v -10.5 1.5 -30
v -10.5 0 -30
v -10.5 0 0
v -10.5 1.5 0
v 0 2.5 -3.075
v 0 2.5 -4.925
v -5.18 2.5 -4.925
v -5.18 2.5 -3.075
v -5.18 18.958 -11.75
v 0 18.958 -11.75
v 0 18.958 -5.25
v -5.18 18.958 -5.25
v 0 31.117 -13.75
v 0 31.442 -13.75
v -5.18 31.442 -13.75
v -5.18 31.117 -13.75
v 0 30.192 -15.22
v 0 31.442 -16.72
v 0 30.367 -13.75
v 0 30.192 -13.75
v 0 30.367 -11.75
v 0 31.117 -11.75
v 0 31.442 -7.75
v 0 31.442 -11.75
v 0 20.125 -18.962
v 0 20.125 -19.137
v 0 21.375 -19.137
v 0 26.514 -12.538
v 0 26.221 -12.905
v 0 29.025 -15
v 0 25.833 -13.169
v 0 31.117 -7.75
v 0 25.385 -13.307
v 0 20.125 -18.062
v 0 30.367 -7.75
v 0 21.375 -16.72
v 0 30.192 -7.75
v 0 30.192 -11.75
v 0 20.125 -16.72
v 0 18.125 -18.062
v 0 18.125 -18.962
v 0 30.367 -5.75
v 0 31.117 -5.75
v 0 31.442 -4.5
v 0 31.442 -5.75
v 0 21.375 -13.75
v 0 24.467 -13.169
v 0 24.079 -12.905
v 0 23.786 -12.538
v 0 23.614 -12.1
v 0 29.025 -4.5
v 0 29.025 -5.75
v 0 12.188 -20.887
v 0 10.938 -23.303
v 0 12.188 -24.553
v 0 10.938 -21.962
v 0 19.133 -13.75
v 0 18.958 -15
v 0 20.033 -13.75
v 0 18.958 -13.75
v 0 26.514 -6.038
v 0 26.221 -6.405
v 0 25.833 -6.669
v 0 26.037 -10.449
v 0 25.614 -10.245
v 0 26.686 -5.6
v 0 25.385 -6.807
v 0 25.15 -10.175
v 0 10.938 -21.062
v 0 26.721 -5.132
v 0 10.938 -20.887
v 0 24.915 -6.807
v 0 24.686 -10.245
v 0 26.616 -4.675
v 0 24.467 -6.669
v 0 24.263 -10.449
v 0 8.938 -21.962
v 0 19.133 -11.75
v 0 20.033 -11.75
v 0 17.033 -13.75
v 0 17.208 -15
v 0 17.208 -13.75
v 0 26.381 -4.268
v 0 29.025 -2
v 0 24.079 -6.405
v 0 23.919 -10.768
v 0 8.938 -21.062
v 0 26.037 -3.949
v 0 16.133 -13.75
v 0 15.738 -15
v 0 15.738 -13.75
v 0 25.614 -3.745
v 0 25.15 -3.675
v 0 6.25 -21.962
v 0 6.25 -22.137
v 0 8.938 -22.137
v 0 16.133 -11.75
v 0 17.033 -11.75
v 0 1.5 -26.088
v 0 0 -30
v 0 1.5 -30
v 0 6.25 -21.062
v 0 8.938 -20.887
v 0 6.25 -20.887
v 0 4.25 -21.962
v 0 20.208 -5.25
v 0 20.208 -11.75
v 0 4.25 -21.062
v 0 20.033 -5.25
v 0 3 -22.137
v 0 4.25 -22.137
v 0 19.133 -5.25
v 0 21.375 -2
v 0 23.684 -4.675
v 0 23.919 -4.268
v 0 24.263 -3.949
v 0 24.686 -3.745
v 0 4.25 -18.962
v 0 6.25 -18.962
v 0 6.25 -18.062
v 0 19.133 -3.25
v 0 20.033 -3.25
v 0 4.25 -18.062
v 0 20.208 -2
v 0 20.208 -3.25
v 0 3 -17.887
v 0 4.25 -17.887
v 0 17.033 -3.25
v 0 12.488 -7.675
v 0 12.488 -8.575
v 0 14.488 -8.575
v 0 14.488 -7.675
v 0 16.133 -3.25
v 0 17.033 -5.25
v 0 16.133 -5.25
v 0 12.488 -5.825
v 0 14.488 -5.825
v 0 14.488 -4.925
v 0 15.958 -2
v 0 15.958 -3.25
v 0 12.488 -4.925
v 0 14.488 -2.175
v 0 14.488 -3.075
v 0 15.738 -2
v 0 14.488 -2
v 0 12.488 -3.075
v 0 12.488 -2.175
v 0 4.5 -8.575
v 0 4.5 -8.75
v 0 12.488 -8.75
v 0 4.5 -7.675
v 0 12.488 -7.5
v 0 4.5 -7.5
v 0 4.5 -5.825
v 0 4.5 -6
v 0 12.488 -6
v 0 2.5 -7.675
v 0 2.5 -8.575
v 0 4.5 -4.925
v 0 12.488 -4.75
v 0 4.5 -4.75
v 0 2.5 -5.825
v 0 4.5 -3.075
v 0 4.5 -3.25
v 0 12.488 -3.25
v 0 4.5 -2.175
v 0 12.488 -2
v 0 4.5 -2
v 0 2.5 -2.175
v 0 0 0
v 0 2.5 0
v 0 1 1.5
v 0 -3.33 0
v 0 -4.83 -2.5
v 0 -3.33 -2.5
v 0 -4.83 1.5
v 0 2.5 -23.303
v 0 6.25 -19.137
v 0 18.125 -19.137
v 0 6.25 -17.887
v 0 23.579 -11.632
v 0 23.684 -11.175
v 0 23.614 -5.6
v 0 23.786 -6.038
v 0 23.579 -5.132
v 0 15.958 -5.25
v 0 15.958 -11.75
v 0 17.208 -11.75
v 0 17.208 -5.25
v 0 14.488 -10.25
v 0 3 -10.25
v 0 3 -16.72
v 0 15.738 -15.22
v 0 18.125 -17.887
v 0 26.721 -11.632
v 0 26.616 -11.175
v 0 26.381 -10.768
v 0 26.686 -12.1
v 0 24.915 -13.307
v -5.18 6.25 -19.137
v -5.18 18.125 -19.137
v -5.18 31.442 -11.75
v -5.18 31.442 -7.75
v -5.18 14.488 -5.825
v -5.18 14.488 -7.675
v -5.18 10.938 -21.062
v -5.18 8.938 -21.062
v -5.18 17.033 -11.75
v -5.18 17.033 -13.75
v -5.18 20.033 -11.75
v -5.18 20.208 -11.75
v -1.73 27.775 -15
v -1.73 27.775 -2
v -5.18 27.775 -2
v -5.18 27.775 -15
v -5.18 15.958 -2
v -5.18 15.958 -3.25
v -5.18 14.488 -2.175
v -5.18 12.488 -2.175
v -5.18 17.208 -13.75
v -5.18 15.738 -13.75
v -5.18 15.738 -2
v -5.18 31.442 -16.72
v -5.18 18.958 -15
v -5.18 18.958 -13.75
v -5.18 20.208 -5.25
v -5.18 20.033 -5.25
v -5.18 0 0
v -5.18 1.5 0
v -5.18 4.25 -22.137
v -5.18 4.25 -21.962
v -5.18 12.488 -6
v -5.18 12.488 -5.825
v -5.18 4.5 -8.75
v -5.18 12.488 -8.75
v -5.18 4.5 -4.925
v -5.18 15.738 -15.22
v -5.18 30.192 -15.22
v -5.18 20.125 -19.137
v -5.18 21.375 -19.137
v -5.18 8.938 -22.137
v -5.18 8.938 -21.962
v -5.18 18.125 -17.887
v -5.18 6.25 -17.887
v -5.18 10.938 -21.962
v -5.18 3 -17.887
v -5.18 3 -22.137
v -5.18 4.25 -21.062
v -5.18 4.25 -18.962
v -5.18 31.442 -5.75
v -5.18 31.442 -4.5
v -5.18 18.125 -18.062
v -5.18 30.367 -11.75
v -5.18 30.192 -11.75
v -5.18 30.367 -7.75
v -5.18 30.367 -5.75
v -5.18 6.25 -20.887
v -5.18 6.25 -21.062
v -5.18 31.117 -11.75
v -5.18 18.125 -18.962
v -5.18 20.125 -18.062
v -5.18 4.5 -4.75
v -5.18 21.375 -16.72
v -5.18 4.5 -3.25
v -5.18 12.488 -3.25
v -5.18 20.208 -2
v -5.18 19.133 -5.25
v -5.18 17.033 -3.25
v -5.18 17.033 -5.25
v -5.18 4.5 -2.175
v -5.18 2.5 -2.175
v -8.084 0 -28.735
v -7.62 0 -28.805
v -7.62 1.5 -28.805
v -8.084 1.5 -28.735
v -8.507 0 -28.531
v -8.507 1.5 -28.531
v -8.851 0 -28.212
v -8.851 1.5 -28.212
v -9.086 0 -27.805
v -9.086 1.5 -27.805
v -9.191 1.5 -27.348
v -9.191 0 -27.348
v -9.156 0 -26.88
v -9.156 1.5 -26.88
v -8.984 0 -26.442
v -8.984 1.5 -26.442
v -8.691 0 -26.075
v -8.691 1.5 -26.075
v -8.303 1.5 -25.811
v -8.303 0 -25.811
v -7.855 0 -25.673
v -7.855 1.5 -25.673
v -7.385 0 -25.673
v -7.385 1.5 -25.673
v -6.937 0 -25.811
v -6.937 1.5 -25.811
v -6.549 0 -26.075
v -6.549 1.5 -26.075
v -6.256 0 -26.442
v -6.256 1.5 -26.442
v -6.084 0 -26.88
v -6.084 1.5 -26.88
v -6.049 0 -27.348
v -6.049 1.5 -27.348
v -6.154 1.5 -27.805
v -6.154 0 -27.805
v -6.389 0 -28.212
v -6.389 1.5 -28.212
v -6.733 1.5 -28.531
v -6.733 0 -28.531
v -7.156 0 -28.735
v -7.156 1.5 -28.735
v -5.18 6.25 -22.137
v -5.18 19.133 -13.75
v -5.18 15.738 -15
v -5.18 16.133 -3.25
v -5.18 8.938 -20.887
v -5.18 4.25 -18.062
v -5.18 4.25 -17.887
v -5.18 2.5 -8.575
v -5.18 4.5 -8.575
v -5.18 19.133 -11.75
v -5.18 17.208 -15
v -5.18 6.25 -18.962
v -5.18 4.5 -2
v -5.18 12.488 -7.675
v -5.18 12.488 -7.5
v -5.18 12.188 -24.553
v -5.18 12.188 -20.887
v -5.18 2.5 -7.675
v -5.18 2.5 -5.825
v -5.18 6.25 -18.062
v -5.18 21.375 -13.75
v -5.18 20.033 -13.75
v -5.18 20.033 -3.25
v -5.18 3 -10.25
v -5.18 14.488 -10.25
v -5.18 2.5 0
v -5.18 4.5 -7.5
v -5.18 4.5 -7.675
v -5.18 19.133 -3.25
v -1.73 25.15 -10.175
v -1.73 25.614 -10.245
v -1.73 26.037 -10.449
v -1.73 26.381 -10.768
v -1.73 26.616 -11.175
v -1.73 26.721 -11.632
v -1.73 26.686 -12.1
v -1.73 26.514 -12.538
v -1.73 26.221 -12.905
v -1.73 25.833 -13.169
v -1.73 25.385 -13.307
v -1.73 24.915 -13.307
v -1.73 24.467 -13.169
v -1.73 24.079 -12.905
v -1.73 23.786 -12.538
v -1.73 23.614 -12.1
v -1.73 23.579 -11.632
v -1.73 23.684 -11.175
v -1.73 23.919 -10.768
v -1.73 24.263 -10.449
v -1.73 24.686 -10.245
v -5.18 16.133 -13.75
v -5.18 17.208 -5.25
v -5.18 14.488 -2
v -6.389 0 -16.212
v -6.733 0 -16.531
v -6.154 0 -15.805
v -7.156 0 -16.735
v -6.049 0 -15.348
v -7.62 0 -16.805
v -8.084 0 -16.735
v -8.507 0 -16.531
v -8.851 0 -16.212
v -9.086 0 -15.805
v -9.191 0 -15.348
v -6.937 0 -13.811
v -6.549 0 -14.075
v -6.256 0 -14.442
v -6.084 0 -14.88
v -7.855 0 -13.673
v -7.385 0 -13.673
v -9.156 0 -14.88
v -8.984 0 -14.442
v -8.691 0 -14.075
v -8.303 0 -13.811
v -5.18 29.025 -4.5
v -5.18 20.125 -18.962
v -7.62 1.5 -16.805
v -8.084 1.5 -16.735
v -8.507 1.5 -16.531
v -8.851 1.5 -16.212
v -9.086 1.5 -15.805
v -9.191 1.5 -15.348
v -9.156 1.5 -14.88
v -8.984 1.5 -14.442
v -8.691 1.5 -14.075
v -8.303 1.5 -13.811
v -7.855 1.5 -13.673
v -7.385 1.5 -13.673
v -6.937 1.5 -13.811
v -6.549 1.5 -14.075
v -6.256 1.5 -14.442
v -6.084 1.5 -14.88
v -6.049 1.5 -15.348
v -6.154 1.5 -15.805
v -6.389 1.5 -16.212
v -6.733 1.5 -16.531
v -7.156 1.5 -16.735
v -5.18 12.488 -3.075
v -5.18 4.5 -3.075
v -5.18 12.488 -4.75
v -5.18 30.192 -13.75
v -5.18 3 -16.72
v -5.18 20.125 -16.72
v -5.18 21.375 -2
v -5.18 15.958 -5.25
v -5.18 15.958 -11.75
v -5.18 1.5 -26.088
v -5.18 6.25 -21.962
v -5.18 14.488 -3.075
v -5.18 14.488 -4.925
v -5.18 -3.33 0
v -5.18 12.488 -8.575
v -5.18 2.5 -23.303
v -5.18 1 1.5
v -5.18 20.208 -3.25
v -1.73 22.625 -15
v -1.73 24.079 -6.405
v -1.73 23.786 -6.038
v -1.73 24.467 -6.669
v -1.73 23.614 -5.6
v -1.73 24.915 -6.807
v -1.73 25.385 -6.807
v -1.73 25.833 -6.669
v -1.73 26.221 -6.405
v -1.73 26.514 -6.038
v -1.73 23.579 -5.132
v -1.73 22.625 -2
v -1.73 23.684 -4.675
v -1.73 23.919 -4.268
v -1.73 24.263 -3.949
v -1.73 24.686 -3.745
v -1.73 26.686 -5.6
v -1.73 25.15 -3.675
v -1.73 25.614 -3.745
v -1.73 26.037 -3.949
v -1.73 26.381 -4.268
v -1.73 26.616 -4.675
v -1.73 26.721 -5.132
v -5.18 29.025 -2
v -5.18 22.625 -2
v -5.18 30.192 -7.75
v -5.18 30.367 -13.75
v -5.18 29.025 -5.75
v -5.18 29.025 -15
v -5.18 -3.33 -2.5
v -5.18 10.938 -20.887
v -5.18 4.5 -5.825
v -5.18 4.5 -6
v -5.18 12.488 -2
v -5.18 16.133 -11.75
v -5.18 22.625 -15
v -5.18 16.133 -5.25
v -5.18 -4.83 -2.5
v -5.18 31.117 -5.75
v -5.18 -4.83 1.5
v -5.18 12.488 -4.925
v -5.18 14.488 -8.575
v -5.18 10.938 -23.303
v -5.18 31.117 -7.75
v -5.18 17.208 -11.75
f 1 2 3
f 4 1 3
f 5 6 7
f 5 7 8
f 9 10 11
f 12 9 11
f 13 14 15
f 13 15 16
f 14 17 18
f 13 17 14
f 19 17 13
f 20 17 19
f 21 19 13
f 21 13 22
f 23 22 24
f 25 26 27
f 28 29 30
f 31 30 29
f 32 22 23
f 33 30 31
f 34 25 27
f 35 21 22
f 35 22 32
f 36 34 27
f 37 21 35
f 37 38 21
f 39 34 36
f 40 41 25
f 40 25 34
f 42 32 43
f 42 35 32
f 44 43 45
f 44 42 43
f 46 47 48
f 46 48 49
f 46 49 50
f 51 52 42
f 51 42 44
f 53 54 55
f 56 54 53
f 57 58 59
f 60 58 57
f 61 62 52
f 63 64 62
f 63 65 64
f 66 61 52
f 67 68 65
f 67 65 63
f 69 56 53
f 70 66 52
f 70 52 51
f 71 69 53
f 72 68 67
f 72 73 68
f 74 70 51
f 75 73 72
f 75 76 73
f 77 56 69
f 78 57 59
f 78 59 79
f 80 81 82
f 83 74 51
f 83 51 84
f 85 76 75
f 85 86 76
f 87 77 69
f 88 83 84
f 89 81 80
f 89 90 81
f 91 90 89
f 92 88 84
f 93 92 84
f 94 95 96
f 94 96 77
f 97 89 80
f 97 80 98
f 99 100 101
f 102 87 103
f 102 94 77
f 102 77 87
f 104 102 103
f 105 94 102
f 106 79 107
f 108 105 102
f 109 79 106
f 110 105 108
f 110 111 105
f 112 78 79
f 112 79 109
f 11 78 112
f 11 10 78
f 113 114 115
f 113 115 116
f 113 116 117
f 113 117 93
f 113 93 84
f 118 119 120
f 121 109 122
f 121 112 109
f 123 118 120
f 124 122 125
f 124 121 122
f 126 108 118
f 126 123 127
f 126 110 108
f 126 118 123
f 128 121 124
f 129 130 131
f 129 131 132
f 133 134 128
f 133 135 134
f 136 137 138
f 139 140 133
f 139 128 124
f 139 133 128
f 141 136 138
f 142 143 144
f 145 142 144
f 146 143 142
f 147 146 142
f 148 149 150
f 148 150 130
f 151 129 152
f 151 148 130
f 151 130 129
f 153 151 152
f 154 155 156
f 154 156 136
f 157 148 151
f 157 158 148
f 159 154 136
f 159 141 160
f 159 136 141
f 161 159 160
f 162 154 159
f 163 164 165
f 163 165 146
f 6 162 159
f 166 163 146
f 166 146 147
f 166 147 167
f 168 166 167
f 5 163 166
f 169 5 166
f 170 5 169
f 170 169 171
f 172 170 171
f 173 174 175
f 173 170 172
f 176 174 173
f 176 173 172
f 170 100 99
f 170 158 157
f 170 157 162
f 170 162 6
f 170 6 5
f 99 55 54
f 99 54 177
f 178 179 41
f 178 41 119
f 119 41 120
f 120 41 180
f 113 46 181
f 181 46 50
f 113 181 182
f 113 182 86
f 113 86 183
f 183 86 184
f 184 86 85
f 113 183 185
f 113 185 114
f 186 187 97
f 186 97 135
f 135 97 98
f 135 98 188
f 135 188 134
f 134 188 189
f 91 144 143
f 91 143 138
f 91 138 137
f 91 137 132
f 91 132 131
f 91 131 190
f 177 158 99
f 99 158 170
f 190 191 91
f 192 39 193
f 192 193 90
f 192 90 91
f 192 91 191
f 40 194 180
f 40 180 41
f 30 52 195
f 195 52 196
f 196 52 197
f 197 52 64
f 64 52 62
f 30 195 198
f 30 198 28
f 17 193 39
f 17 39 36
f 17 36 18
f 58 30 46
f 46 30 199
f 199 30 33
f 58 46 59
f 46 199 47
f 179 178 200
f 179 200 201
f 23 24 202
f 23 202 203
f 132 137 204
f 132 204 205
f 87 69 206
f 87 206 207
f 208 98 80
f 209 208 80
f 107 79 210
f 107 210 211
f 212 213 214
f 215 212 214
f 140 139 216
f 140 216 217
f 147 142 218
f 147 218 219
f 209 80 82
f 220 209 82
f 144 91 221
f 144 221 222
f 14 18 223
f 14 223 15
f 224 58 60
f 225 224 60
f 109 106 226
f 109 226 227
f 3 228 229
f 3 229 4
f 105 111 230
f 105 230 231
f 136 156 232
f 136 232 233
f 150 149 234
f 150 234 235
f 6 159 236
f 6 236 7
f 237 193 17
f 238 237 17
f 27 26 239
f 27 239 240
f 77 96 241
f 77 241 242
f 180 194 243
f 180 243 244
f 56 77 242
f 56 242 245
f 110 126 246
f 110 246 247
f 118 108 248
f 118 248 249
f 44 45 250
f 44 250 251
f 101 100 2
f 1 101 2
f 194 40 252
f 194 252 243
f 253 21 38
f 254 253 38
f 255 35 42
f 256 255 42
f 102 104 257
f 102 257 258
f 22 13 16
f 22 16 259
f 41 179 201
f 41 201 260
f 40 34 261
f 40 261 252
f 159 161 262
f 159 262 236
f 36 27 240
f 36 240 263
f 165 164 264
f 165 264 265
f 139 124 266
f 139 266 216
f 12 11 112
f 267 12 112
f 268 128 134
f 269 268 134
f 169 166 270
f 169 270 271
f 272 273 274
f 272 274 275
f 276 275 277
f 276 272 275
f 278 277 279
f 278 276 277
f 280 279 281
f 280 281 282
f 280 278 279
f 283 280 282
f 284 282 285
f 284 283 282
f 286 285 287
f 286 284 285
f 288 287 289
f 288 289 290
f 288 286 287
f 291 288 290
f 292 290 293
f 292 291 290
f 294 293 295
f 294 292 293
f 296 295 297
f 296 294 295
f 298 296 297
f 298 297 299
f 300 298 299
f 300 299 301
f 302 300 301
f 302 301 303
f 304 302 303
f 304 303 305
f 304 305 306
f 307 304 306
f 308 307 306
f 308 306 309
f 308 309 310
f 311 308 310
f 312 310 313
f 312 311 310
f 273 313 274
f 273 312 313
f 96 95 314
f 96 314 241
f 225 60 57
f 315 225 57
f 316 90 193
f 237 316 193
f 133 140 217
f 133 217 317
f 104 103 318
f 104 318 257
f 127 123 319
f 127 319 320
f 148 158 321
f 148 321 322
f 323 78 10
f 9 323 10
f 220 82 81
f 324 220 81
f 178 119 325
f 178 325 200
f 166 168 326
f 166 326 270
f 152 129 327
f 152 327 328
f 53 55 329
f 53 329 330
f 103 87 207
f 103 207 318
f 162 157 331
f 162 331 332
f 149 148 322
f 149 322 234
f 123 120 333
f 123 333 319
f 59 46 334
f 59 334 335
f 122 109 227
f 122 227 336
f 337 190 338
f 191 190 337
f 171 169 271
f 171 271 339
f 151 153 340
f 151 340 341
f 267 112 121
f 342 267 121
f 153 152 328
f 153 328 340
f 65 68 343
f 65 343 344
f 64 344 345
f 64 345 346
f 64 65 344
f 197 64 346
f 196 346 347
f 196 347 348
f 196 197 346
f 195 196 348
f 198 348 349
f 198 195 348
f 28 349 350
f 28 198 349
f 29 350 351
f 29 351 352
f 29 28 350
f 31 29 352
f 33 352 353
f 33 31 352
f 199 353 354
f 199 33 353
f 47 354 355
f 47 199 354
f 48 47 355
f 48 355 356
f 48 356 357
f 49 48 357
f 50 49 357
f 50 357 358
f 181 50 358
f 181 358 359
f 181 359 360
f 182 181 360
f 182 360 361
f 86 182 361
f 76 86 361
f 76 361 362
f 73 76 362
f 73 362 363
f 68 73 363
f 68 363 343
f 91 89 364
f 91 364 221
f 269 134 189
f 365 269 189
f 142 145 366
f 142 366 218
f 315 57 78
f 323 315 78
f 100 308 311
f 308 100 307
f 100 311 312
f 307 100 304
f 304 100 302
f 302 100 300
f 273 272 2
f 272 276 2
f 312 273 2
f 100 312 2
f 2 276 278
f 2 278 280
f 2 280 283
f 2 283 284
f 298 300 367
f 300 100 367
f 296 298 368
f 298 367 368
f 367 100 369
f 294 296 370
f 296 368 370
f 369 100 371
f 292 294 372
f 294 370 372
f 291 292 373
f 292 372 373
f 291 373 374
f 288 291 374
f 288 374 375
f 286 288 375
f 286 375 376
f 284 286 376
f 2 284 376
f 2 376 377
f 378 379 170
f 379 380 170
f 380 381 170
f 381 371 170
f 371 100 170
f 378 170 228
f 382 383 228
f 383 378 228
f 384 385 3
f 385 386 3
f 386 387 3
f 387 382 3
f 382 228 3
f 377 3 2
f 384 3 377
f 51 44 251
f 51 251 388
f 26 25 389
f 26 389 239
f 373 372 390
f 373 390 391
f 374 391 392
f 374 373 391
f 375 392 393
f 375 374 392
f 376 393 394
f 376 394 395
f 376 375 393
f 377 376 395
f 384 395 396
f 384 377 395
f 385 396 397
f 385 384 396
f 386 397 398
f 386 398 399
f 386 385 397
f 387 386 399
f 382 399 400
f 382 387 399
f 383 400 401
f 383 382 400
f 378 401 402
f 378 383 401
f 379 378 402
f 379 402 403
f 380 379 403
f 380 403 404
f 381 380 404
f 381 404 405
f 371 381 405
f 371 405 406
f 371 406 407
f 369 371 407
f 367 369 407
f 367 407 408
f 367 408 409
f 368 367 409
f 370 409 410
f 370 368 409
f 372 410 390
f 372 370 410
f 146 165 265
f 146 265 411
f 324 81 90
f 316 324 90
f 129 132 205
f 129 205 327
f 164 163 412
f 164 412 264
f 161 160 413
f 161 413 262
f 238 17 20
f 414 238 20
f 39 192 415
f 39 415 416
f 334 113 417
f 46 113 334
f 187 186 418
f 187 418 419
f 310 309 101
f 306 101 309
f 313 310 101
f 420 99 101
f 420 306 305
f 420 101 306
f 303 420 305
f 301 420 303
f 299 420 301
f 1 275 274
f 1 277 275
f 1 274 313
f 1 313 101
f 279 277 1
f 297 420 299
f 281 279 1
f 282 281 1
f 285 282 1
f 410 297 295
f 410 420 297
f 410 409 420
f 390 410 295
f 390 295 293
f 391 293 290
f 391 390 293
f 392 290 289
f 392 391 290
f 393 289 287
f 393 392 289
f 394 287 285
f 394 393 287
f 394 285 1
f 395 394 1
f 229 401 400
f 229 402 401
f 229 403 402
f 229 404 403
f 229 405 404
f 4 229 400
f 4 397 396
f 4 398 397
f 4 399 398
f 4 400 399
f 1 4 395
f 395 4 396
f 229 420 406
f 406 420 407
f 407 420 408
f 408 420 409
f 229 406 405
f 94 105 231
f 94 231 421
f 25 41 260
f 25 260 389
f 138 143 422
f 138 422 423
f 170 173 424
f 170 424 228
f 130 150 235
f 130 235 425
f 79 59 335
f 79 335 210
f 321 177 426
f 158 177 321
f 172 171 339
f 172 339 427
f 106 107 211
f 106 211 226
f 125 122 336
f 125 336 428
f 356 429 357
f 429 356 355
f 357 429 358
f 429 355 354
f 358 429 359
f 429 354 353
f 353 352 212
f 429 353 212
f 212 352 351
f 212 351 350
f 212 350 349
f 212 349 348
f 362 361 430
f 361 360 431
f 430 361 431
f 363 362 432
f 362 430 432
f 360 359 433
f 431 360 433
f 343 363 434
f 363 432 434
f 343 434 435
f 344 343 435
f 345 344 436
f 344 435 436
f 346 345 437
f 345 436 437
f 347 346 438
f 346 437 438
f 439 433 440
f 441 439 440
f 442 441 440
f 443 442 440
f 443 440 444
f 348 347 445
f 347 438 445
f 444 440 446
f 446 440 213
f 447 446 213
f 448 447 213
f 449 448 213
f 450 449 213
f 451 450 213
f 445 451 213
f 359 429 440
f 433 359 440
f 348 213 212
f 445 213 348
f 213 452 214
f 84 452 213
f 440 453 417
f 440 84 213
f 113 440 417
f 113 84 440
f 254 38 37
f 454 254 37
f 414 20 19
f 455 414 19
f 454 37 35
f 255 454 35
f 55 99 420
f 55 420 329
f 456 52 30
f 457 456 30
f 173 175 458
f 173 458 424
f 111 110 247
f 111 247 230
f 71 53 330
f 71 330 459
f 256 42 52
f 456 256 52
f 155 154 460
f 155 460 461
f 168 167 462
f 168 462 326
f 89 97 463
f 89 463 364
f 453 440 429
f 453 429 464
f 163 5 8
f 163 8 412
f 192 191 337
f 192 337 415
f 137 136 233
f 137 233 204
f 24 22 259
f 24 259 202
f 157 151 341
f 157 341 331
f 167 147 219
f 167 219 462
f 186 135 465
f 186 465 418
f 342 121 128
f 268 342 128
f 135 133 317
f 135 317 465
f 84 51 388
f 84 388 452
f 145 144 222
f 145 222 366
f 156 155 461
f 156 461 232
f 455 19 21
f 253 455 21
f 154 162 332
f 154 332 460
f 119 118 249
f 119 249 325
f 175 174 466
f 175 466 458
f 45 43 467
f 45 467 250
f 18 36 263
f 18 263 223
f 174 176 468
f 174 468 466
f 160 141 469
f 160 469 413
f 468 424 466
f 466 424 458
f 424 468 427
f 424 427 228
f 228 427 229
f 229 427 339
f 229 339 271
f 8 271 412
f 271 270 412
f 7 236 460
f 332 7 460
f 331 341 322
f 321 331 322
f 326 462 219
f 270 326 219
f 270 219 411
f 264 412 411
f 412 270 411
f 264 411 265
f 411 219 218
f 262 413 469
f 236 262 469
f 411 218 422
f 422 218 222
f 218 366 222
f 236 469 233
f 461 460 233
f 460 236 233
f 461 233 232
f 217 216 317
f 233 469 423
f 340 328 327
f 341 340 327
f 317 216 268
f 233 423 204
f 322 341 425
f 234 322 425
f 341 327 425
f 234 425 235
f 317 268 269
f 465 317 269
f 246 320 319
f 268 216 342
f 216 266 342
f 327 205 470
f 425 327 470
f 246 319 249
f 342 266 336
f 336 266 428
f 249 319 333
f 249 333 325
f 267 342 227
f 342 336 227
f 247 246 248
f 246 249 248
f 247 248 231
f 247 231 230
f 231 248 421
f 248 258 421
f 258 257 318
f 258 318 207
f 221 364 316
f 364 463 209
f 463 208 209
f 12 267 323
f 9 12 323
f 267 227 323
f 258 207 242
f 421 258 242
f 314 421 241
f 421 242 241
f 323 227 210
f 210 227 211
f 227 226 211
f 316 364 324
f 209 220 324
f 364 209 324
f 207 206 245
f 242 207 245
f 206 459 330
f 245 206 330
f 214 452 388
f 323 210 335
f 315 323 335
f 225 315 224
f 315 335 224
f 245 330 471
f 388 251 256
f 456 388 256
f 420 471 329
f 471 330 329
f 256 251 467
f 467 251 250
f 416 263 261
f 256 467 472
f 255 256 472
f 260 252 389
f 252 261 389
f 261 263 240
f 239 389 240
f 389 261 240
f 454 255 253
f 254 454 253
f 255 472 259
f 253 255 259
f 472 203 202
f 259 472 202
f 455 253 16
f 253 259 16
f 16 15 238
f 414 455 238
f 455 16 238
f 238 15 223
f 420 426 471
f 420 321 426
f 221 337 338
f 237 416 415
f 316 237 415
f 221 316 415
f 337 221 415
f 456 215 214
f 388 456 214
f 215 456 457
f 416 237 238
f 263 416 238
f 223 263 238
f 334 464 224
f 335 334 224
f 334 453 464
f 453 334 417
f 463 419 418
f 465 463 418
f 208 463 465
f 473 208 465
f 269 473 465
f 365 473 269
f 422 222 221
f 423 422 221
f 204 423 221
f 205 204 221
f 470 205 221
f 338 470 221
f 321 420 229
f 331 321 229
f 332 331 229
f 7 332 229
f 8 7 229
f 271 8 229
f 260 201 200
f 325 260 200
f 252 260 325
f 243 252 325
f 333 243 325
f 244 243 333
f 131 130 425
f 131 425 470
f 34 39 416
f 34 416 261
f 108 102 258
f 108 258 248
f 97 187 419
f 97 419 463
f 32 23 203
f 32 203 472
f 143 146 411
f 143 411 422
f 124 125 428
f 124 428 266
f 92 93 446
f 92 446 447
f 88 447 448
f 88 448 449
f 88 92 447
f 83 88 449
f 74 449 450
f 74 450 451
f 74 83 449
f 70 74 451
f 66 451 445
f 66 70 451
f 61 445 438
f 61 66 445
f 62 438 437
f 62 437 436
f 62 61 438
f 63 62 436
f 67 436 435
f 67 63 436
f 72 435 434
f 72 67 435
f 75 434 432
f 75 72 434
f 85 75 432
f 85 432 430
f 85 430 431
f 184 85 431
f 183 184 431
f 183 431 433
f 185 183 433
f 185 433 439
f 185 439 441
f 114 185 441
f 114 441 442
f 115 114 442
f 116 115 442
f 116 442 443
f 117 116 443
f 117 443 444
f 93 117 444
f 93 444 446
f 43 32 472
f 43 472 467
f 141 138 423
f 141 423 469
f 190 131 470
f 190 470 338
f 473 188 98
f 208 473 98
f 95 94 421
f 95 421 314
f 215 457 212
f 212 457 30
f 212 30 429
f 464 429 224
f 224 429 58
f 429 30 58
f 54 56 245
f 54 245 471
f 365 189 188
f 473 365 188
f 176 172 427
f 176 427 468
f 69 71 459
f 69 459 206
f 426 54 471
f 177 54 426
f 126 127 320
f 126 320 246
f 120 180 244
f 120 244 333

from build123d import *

# Parameters (mm, degrees)
BOSS_EXTRUDE1_DEPTH = 5.18
CUT_EXTRUDE4_REACH  = 42.076
SKETCH2_W           = 3.45
SKETCH2_H           = 5.15
CUT_EXTRUDE3_REACH  = 43.319
SKETCH7_R           = 1.575
SKETCH3_W           = 10.5
SKETCH3_H           = 30
SKETCH3_R           = 1.575
BOSS_EXTRUDE2_DEPTH = 1.5


with BuildPart() as part:
    # Sketch1 → Boss-Extrude1 (new body)
    with BuildSketch(Plane(origin=(0, 0, 0), x_dir=(0, 0, -1), z_dir=(1, 0, 0))):
        Polygon((2, 29.025), (2, 21.375), (13.75, 21.375), (13.75, 20.033333333), (11.75, 20.033333333), (11.75, 20.208333333), (5.25, 20.208333333), (5.25, 20.033333333), (3.25, 20.033333333), (3.25, 20.208333333), (2, 20.208333333), (2, 15.958333333), (3.25, 15.958333333), (3.25, 16.133333333), (5.25, 16.133333333), (5.25, 15.958333333), (11.75, 15.958333333), (11.75, 16.133333333), (13.75, 16.133333333), (13.75, 15.738333333), (2, 15.738333333), (2, 14.488333333), (2.175, 14.488333333), (2.175, 12.488333333), (2, 12.488333333), (2, 4.5), (2.175, 4.5), (2.175, 2.5), (0, 2.5), (-1.5, 1), (-1.5, -4.83), (2.5, -4.83), (2.5, -3.33), (0, -3.33), (0, 0), (26.303333333, 0), (24.553333333, 12.1875), (20.886666667, 12.1875), (20.886666667, 10.9375), (21.061666667, 10.9375), (21.061666667, 8.9375), (20.886666667, 8.9375), (20.886666667, 6.25), (21.061666667, 6.25), (21.061666667, 4.25), (18.961666667, 4.25), (18.961666667, 6.25), (19.136666667, 6.25), (19.136666667, 18.125), (18.961666667, 18.125), (18.961666667, 20.125), (19.136666667, 20.125), (19.136666667, 21.375), (16.72, 21.375), (16.72, 31.441666667), (13.75, 31.441666667), (13.75, 31.116666667), (11.75, 31.116666667), (11.75, 31.441666667), (7.75, 31.441666667), (7.75, 31.116666667), (5.75, 31.116666667), (5.75, 31.441666667), (4.5, 31.441666667), (4.5, 29.025), align=None)
        Polygon((5.75, 29.025), (15, 29.025), (15, 18.958333333), (13.75, 18.958333333), (13.75, 19.133333333), (11.75, 19.133333333), (11.75, 18.958333333), (5.25, 18.958333333), (5.25, 19.133333333), (3.25, 19.133333333), (3.25, 17.033333333), (5.25, 17.033333333), (5.25, 17.208333333), (11.75, 17.208333333), (11.75, 17.033333333), (13.75, 17.033333333), (13.75, 17.208333333), (15, 17.208333333), (15, 15.738333333), (15.22, 15.738333333), (15.22, 30.191666667), (13.75, 30.191666667), (13.75, 30.366666667), (11.75, 30.366666667), (11.75, 30.191666667), (7.75, 30.191666667), (7.75, 30.366666667), (5.75, 30.366666667), align=None, mode=Mode.SUBTRACT)
        Polygon((18.061666667, 4.25), (17.886666667, 4.25), (17.886666667, 3), (22.136666667, 3), (22.136666667, 4.25), (21.961666667, 4.25), (21.961666667, 6.25), (22.136666667, 6.25), (22.136666667, 8.9375), (21.961666667, 8.9375), (21.961666667, 10.9375), (23.303333333, 10.9375), (23.303333333, 2.5), (8.575, 2.5), (8.575, 4.5), (8.75, 4.5), (8.75, 12.488333333), (8.575, 12.488333333), (8.575, 14.488333333), (10.25, 14.488333333), (10.25, 3), (16.72, 3), (16.72, 20.125), (18.061666667, 20.125), (18.061666667, 18.125), (17.886666667, 18.125), (17.886666667, 6.25), (18.061666667, 6.25), align=None, mode=Mode.SUBTRACT)
        Polygon((3.075, 2.5), (3.075, 4.5), (3.25, 4.5), (3.25, 12.488333333), (3.075, 12.488333333), (3.075, 14.488333333), (4.925, 14.488333333), (4.925, 12.488333333), (4.75, 12.488333333), (4.75, 4.5), (4.925, 4.5), (4.925, 2.5), align=None, mode=Mode.SUBTRACT)
        Polygon((5.825, 2.5), (5.825, 4.5), (6, 4.5), (6, 12.488333333), (5.825, 12.488333333), (5.825, 14.488333333), (7.675, 14.488333333), (7.675, 12.488333333), (7.5, 12.488333333), (7.5, 4.5), (7.675, 4.5), (7.675, 2.5), align=None, mode=Mode.SUBTRACT)
    extrude(amount=BOSS_EXTRUDE1_DEPTH)

    # Sketch2 → Cut-Extrude4 (cut, up to next)
    with BuildSketch(Plane.XY.offset(-2), mode=Mode.PRIVATE) as cut_extrude4_sk1:
        with Locations((3.455, 25.2)):
            Rectangle(SKETCH2_W, SKETCH2_H)
    cut_extrude4_tool1 = extrude(cut_extrude4_sk1.sketch, amount=-CUT_EXTRUDE4_REACH, mode=Mode.PRIVATE) & part.part
    add(cut_extrude4_tool1.solids().sort_by_distance((3.455, 25.2, -2))[0], mode=Mode.SUBTRACT)

    # Sketch7 → Cut-Extrude3 (cut, up to next)
    with BuildSketch(Plane.ZY, mode=Mode.PRIVATE) as cut_extrude3_sk1:
        with Locations((-5.25, 25.15)):
            Circle(SKETCH7_R)
    cut_extrude3_tool1 = extrude(cut_extrude3_sk1.sketch, amount=-CUT_EXTRUDE3_REACH, mode=Mode.PRIVATE) & part.part
    # Sketch7 → Cut-Extrude3 (cut, up to next)
    with BuildSketch(Plane.ZY, mode=Mode.PRIVATE) as cut_extrude3_sk2:
        with Locations((-11.75, 25.15)):
            Circle(SKETCH7_R)
    cut_extrude3_tool2 = extrude(cut_extrude3_sk2.sketch, amount=-CUT_EXTRUDE3_REACH, mode=Mode.PRIVATE) & part.part
    add(cut_extrude3_tool1.solids().sort_by_distance((0, 25.15, -5.25))[0], mode=Mode.SUBTRACT)
    add(cut_extrude3_tool2.solids().sort_by_distance((0, 25.15, -11.75))[0], mode=Mode.SUBTRACT)

    # Sketch3 → Boss-Extrude2 (add)
    with BuildSketch(Plane.XZ):
        with Locations((5.25, -15)):
            Rectangle(SKETCH3_W, SKETCH3_H)
        with Locations(Location((7.62, -15.23, 0), (0, 0, 270))):
            Circle(SKETCH3_R, mode=Mode.SUBTRACT)
        with Locations(Location((7.62, -27.23, 0), (0, 0, 270))):
            Circle(SKETCH3_R, mode=Mode.SUBTRACT)
    extrude(amount=-BOSS_EXTRUDE2_DEPTH)


with BuildPart() as body_2:
    # Mirror1: mirrored copy
    add(part.part.mirror(Plane.ZY))


solid = body_2.part
